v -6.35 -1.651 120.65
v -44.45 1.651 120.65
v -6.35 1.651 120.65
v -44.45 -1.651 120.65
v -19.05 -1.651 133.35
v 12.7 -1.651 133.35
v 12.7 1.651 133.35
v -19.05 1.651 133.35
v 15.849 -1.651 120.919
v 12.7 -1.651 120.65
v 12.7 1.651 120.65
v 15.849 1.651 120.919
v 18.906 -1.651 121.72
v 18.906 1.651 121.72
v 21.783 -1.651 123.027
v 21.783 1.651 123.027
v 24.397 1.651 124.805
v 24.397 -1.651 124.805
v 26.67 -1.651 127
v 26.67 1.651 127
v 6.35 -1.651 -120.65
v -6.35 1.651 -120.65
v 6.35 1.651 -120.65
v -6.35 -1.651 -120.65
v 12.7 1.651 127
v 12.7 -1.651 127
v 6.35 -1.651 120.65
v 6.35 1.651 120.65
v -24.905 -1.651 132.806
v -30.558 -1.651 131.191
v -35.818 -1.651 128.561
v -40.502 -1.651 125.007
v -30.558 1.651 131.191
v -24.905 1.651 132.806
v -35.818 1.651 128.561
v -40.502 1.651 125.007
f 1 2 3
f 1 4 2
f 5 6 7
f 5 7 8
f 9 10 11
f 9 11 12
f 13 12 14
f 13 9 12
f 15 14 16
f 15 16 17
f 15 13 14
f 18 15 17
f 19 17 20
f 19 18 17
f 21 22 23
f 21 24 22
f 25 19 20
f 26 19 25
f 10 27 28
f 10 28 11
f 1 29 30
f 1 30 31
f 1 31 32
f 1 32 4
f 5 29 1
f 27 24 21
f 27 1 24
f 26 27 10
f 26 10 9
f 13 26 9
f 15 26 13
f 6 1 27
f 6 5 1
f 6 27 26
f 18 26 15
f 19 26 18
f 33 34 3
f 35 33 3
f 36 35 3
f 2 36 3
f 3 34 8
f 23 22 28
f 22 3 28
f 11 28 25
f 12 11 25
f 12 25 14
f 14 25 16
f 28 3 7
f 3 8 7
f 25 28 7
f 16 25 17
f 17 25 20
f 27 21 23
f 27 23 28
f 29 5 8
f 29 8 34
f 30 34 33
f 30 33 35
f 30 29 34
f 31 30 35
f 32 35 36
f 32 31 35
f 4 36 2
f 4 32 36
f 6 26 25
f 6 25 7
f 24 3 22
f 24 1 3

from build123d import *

# Parameters (mm, degrees)
F0_W     = 12.7
F0_H     = 241.3
F0_H_2   = 12.7
F1_DEPTH = 1.651


with BuildPart() as f1:
    # F0 (on Front) → F1 (new body, symmetric)
    with BuildSketch(Plane.XZ):
        Rectangle(F0_W, F0_H)
        Polygon((6.35, 133.35), (6.35, 120.65), (12.7, 120.65), (12.7, 127), (12.7, 133.35), align=None)
        with Locations((0, 127)):
            Rectangle(F0_W, F0_H_2)
        with BuildLine():
            Line((-44.45, 120.65), (-6.35, 120.65))
            Line((-6.35, 120.65), (-6.35, 133.35))
            Line((-6.35, 133.35), (-19.05, 133.35))
            ThreePointArc((-19.05, 133.35), (-33.249032, 129.998063), (-44.45, 120.65))
        make_face()
        with BuildLine():
            Line((12.7, 127), (12.7, 120.65))
            ThreePointArc((12.7, 120.65), (20.372734, 122.311985), (26.67, 127))
            Line((26.67, 127), (12.7, 127))
        make_face()
    extrude(amount=F1_DEPTH, both=True)


solid = f1.part
